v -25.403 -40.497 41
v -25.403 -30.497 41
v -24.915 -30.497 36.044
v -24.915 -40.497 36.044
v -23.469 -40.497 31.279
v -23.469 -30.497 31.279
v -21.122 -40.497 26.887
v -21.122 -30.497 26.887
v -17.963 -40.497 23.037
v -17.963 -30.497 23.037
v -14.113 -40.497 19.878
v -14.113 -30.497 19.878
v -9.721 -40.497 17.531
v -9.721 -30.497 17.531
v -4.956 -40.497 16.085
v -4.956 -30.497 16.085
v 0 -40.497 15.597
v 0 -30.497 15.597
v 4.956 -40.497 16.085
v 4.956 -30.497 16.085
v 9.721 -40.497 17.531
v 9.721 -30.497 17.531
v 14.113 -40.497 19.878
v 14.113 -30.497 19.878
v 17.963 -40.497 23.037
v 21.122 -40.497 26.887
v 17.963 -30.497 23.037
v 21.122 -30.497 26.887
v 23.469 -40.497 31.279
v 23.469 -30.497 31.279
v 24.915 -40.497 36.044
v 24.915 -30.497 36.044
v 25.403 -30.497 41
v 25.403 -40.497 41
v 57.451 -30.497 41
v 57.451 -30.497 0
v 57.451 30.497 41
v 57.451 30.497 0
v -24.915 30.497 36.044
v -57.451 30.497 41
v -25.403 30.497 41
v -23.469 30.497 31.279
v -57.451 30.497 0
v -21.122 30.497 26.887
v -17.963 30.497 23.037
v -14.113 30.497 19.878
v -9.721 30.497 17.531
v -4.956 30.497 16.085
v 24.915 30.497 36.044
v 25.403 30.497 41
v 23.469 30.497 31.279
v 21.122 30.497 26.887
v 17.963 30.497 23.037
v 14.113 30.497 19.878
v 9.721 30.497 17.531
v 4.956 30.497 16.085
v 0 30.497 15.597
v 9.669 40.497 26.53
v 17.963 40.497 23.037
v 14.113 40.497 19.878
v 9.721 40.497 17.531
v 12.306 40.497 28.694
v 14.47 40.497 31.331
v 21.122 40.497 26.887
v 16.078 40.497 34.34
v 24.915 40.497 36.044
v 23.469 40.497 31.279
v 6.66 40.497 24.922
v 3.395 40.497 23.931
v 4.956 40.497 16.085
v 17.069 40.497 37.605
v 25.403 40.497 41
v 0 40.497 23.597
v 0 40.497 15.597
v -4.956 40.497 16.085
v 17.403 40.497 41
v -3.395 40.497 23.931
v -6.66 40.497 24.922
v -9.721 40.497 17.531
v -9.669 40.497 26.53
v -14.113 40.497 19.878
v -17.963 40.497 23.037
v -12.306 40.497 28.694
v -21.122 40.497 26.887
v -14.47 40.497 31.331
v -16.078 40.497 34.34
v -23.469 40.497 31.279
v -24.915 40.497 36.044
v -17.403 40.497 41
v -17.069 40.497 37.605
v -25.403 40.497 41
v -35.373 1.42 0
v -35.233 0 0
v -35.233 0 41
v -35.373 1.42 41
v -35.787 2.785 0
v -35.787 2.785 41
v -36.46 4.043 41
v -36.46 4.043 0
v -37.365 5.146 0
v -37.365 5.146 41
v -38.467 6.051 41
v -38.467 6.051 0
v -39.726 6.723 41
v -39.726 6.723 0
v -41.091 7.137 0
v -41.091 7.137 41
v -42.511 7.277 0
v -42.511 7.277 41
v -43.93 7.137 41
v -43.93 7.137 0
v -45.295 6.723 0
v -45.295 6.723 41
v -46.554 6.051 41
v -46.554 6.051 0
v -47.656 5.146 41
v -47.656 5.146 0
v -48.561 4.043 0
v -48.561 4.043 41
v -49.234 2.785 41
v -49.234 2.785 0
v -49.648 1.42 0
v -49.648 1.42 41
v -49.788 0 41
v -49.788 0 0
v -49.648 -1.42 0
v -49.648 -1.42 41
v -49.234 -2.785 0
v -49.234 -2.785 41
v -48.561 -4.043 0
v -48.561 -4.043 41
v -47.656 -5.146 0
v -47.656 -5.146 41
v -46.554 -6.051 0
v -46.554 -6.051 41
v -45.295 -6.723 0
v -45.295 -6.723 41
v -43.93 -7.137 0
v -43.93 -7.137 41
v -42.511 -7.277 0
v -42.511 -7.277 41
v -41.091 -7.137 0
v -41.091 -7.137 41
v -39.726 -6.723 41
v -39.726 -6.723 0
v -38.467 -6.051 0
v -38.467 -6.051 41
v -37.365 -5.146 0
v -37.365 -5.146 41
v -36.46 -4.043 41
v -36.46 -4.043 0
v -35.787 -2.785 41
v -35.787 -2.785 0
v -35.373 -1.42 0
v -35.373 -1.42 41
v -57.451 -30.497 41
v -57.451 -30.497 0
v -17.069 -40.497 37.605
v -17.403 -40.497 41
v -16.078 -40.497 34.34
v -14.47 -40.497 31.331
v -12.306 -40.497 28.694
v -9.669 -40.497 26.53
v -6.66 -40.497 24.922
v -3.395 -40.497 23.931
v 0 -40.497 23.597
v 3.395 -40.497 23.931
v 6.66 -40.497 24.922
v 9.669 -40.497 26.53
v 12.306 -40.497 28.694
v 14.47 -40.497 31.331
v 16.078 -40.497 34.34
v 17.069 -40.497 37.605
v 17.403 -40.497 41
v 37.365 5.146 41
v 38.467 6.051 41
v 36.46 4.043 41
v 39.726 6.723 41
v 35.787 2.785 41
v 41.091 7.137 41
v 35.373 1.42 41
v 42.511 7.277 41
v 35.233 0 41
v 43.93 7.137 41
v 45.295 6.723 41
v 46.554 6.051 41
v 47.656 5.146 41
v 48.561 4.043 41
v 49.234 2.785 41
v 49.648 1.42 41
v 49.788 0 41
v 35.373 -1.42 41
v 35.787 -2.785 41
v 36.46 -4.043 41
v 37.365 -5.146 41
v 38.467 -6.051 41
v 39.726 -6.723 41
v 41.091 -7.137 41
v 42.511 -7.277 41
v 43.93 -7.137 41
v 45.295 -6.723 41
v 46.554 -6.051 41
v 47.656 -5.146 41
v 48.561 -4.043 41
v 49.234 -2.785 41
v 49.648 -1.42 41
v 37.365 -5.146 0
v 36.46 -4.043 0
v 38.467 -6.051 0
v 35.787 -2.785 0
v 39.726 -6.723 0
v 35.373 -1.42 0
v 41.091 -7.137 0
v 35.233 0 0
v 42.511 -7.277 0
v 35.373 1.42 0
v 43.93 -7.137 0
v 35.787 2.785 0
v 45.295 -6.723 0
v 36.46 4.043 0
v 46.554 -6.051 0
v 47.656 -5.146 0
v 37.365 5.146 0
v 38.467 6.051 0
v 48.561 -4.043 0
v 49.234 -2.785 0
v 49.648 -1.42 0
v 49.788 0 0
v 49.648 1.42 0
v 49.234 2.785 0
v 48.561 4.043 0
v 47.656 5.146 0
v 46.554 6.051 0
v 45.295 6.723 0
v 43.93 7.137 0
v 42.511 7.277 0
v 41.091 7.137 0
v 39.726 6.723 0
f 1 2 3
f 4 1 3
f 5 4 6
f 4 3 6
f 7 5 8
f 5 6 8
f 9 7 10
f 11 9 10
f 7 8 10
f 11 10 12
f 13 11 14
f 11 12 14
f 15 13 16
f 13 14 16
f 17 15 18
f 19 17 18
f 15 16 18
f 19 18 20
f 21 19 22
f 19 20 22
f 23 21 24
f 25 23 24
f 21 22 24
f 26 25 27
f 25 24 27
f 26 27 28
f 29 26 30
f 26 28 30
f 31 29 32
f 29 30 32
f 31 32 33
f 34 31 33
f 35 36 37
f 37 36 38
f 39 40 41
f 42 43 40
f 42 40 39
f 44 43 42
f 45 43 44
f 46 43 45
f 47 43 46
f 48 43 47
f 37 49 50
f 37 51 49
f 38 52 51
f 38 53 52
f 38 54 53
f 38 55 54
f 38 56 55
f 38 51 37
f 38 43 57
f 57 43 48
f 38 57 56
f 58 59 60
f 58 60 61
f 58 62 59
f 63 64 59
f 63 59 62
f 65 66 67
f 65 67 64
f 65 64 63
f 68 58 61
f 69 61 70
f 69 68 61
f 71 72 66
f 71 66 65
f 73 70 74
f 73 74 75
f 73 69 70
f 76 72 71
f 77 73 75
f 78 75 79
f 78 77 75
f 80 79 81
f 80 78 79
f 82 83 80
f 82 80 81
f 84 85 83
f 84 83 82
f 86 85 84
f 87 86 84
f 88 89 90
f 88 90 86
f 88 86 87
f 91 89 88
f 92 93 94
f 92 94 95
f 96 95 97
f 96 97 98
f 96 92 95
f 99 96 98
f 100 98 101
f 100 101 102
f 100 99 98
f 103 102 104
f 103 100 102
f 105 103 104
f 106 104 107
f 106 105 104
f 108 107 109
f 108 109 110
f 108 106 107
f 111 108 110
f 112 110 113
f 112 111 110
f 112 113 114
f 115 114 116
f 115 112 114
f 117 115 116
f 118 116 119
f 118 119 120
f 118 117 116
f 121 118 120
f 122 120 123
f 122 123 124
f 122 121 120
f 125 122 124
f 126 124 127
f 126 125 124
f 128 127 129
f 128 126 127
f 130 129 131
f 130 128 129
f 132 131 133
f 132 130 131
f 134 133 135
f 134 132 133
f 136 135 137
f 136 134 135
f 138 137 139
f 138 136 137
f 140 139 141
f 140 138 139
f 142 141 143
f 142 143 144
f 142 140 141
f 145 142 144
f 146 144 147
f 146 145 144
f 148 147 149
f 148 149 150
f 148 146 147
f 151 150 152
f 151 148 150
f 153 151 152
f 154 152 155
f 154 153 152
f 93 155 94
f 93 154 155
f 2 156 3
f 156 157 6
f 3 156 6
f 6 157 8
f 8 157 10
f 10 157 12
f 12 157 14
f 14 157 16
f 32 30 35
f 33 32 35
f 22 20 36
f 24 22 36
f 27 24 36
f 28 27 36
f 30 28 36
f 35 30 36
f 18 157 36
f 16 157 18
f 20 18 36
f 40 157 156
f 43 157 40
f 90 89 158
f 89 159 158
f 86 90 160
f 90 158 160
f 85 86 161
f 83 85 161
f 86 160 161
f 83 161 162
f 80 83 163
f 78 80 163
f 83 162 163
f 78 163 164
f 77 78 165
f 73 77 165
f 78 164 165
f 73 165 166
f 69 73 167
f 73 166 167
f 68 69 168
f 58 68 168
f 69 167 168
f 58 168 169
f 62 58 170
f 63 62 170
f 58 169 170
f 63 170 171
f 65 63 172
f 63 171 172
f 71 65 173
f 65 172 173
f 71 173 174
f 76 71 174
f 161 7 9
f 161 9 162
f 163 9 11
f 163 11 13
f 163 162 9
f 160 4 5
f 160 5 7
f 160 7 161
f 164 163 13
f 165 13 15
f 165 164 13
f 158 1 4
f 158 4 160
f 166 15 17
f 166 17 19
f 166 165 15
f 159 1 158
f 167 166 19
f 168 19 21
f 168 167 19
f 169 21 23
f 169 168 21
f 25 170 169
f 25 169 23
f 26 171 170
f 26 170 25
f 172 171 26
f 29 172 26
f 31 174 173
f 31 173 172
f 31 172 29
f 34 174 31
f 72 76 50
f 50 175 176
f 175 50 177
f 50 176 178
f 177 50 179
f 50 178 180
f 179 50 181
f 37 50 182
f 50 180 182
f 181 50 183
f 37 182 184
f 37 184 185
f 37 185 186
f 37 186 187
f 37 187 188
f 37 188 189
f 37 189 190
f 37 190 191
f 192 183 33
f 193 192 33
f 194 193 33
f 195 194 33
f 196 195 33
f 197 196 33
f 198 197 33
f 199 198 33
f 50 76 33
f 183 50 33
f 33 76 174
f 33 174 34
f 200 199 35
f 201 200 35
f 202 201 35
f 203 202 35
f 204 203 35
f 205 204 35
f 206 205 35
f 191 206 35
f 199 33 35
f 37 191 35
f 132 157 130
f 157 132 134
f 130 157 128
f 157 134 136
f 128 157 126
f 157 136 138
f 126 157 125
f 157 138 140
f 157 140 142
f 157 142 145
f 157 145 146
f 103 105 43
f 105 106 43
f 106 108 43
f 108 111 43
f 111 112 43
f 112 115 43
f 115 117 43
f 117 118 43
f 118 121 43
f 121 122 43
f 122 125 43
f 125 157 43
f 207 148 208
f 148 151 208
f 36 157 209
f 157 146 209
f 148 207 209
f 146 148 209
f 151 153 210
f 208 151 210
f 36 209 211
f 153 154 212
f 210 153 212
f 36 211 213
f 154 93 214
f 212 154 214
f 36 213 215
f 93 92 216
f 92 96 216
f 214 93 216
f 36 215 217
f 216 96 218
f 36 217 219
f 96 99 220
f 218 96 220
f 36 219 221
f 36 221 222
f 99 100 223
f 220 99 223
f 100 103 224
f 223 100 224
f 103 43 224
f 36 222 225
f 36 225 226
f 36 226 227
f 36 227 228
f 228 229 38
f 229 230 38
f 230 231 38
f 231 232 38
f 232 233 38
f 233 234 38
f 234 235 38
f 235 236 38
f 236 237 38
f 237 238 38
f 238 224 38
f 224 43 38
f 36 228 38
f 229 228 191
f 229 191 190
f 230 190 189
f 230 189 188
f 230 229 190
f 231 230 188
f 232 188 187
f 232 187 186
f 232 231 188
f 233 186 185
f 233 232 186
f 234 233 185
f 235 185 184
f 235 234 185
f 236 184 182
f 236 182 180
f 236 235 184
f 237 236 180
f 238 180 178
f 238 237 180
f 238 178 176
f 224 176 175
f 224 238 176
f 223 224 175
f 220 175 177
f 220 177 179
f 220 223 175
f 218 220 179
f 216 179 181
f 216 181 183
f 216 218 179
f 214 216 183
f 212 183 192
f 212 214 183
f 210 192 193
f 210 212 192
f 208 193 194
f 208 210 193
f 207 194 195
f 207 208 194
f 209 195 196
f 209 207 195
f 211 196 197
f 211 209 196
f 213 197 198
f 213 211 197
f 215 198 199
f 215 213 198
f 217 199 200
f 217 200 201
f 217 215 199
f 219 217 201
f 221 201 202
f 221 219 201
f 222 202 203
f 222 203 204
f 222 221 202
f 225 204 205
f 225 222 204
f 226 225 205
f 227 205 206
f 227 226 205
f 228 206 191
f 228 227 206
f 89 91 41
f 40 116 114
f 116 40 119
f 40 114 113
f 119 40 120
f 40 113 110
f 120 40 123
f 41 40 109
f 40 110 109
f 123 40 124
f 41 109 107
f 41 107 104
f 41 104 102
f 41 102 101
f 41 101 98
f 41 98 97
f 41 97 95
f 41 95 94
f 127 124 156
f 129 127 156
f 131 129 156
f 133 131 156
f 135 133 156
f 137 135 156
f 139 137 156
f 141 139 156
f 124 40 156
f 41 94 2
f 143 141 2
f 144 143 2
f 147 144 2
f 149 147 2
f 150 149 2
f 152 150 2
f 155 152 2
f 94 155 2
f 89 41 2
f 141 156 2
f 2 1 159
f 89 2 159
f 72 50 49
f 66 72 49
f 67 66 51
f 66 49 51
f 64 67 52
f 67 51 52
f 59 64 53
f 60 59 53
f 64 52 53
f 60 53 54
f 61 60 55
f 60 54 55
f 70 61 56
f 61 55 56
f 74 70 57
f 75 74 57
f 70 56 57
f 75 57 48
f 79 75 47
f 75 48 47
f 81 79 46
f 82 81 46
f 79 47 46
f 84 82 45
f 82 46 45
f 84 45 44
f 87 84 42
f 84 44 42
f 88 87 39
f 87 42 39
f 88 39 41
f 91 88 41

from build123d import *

# Parameters (mm, degrees)
F0_W     = 114.9016693234
F0_H     = 60.9933659434
F0_R     = 7.2773079639
F1_DEPTH = 41
F3_DEPTH = 60.9943659434
F4_DEPTH = 10
F6_DEPTH = 10


with BuildPart() as f1:
    # F0 (on Top) → F1 (new body)
    with BuildSketch(Plane.XY):
        Rectangle(F0_W, F0_H)
        with Locations((-42.510535568, 0)):
            Circle(F0_R, mode=Mode.SUBTRACT)
        with Locations((42.510535568, 0)):
            Circle(F0_R, mode=Mode.SUBTRACT)
    extrude(amount=F1_DEPTH)

    # F2 (on face) → F3 (cut, through all)
    with BuildSketch(Plane.XZ.offset(30.4966829717)):
        with BuildLine():
            ThreePointArc((-17.4030642732, 41), (0, 23.5969357268), (17.4030642732, 41))
            Line((17.4030642732, 41), (-17.4030642732, 41))
        make_face()
    extrude(amount=-F3_DEPTH, mode=Mode.SUBTRACT)

    # F2 (on face) → F4 (join)
    with BuildSketch(Plane.XZ.offset(30.4966829717)):
        with BuildLine():
            Line((25.4030636924, 41), (17.4030642732, 41))
            ThreePointArc((17.4030642732, 41), (0, 23.5969357268), (-17.4030642732, 41))
            Line((-17.4030642732, 41), (-25.4030636924, 41))
            ThreePointArc((-25.4030636924, 41), (0, 15.5969363076), (25.4030636924, 41))
        make_face()
    extrude(amount=F4_DEPTH)

    # F5 (on face) → F6 (join)
    with BuildSketch(Plane(origin=(0, 30.4966829717, 0), x_dir=(-1, 0, 0), z_dir=(0, 1, 0))):
        with BuildLine():
            ThreePointArc((-25.4030636924, 41), (0, 15.5969363076), (25.4030636924, 41))
            Line((25.4030636924, 41), (17.4030642732, 41))
            ThreePointArc((17.4030642732, 41), (0, 23.5969357268), (-17.4030642732, 41))
            Line((-17.4030642732, 41), (-25.4030636924, 41))
        make_face()
    extrude(amount=F6_DEPTH)


solid = f1.part
